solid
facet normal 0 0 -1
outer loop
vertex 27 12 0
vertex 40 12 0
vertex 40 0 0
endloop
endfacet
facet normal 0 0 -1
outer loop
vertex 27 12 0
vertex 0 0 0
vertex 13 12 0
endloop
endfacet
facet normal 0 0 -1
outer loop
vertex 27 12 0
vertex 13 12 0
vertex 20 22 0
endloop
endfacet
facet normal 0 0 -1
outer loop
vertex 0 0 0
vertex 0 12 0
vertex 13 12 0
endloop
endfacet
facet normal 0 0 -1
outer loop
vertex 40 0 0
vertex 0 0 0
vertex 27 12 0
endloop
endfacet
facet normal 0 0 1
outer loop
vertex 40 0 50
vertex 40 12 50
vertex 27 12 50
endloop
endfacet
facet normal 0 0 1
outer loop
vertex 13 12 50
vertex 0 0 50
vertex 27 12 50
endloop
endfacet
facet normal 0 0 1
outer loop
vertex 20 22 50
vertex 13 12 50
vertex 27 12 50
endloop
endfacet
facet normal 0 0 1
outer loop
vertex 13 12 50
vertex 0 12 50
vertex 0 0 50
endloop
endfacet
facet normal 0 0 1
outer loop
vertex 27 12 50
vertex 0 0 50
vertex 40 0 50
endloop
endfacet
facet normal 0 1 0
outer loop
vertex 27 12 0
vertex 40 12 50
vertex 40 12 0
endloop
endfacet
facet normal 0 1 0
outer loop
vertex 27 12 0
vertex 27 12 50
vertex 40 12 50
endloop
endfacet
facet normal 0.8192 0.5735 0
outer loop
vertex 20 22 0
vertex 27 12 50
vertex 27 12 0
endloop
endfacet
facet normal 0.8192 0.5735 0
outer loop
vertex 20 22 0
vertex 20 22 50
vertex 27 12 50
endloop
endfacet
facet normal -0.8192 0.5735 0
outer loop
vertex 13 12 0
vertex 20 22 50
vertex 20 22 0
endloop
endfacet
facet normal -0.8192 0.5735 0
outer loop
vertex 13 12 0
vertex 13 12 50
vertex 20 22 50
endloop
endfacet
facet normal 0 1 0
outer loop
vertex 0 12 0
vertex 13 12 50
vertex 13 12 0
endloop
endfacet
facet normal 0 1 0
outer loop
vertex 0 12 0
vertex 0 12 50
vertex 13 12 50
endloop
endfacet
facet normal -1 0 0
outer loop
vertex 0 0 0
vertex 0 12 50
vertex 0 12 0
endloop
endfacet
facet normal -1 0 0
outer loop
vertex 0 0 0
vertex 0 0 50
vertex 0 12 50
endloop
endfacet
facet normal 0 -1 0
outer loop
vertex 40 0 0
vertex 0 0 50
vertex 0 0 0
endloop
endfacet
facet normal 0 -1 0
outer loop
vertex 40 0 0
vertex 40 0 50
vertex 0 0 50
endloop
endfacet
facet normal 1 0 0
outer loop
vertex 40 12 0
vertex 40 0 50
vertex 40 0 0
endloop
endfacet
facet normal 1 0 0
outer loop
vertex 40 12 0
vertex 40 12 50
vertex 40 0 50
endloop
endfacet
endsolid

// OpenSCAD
$fn = 32;

// ----------------------------------------------------------------------
// V guide rail: vrib, 40 mm wide
// ----------------------------------------------------------------------

// --- parameters (mm) ---
rail_w = 40;              // rail width, X
base_t = 12;              // base plate thickness
v_depth = 10;             // V feature depth / height
v_half_w = 7;             // half width of the V at the base face
plate_t = 50;             // rail length, Z (the extrusion height)

profile = [[0, 0], [40, 0], [40, 12], [27, 12], [20, 22], [13, 12], [0, 12]];  // primary outline, 7 points, counter clockwise

// --- the one profile operation ---
linear_extrude(height = plate_t) polygon(points = profile);
